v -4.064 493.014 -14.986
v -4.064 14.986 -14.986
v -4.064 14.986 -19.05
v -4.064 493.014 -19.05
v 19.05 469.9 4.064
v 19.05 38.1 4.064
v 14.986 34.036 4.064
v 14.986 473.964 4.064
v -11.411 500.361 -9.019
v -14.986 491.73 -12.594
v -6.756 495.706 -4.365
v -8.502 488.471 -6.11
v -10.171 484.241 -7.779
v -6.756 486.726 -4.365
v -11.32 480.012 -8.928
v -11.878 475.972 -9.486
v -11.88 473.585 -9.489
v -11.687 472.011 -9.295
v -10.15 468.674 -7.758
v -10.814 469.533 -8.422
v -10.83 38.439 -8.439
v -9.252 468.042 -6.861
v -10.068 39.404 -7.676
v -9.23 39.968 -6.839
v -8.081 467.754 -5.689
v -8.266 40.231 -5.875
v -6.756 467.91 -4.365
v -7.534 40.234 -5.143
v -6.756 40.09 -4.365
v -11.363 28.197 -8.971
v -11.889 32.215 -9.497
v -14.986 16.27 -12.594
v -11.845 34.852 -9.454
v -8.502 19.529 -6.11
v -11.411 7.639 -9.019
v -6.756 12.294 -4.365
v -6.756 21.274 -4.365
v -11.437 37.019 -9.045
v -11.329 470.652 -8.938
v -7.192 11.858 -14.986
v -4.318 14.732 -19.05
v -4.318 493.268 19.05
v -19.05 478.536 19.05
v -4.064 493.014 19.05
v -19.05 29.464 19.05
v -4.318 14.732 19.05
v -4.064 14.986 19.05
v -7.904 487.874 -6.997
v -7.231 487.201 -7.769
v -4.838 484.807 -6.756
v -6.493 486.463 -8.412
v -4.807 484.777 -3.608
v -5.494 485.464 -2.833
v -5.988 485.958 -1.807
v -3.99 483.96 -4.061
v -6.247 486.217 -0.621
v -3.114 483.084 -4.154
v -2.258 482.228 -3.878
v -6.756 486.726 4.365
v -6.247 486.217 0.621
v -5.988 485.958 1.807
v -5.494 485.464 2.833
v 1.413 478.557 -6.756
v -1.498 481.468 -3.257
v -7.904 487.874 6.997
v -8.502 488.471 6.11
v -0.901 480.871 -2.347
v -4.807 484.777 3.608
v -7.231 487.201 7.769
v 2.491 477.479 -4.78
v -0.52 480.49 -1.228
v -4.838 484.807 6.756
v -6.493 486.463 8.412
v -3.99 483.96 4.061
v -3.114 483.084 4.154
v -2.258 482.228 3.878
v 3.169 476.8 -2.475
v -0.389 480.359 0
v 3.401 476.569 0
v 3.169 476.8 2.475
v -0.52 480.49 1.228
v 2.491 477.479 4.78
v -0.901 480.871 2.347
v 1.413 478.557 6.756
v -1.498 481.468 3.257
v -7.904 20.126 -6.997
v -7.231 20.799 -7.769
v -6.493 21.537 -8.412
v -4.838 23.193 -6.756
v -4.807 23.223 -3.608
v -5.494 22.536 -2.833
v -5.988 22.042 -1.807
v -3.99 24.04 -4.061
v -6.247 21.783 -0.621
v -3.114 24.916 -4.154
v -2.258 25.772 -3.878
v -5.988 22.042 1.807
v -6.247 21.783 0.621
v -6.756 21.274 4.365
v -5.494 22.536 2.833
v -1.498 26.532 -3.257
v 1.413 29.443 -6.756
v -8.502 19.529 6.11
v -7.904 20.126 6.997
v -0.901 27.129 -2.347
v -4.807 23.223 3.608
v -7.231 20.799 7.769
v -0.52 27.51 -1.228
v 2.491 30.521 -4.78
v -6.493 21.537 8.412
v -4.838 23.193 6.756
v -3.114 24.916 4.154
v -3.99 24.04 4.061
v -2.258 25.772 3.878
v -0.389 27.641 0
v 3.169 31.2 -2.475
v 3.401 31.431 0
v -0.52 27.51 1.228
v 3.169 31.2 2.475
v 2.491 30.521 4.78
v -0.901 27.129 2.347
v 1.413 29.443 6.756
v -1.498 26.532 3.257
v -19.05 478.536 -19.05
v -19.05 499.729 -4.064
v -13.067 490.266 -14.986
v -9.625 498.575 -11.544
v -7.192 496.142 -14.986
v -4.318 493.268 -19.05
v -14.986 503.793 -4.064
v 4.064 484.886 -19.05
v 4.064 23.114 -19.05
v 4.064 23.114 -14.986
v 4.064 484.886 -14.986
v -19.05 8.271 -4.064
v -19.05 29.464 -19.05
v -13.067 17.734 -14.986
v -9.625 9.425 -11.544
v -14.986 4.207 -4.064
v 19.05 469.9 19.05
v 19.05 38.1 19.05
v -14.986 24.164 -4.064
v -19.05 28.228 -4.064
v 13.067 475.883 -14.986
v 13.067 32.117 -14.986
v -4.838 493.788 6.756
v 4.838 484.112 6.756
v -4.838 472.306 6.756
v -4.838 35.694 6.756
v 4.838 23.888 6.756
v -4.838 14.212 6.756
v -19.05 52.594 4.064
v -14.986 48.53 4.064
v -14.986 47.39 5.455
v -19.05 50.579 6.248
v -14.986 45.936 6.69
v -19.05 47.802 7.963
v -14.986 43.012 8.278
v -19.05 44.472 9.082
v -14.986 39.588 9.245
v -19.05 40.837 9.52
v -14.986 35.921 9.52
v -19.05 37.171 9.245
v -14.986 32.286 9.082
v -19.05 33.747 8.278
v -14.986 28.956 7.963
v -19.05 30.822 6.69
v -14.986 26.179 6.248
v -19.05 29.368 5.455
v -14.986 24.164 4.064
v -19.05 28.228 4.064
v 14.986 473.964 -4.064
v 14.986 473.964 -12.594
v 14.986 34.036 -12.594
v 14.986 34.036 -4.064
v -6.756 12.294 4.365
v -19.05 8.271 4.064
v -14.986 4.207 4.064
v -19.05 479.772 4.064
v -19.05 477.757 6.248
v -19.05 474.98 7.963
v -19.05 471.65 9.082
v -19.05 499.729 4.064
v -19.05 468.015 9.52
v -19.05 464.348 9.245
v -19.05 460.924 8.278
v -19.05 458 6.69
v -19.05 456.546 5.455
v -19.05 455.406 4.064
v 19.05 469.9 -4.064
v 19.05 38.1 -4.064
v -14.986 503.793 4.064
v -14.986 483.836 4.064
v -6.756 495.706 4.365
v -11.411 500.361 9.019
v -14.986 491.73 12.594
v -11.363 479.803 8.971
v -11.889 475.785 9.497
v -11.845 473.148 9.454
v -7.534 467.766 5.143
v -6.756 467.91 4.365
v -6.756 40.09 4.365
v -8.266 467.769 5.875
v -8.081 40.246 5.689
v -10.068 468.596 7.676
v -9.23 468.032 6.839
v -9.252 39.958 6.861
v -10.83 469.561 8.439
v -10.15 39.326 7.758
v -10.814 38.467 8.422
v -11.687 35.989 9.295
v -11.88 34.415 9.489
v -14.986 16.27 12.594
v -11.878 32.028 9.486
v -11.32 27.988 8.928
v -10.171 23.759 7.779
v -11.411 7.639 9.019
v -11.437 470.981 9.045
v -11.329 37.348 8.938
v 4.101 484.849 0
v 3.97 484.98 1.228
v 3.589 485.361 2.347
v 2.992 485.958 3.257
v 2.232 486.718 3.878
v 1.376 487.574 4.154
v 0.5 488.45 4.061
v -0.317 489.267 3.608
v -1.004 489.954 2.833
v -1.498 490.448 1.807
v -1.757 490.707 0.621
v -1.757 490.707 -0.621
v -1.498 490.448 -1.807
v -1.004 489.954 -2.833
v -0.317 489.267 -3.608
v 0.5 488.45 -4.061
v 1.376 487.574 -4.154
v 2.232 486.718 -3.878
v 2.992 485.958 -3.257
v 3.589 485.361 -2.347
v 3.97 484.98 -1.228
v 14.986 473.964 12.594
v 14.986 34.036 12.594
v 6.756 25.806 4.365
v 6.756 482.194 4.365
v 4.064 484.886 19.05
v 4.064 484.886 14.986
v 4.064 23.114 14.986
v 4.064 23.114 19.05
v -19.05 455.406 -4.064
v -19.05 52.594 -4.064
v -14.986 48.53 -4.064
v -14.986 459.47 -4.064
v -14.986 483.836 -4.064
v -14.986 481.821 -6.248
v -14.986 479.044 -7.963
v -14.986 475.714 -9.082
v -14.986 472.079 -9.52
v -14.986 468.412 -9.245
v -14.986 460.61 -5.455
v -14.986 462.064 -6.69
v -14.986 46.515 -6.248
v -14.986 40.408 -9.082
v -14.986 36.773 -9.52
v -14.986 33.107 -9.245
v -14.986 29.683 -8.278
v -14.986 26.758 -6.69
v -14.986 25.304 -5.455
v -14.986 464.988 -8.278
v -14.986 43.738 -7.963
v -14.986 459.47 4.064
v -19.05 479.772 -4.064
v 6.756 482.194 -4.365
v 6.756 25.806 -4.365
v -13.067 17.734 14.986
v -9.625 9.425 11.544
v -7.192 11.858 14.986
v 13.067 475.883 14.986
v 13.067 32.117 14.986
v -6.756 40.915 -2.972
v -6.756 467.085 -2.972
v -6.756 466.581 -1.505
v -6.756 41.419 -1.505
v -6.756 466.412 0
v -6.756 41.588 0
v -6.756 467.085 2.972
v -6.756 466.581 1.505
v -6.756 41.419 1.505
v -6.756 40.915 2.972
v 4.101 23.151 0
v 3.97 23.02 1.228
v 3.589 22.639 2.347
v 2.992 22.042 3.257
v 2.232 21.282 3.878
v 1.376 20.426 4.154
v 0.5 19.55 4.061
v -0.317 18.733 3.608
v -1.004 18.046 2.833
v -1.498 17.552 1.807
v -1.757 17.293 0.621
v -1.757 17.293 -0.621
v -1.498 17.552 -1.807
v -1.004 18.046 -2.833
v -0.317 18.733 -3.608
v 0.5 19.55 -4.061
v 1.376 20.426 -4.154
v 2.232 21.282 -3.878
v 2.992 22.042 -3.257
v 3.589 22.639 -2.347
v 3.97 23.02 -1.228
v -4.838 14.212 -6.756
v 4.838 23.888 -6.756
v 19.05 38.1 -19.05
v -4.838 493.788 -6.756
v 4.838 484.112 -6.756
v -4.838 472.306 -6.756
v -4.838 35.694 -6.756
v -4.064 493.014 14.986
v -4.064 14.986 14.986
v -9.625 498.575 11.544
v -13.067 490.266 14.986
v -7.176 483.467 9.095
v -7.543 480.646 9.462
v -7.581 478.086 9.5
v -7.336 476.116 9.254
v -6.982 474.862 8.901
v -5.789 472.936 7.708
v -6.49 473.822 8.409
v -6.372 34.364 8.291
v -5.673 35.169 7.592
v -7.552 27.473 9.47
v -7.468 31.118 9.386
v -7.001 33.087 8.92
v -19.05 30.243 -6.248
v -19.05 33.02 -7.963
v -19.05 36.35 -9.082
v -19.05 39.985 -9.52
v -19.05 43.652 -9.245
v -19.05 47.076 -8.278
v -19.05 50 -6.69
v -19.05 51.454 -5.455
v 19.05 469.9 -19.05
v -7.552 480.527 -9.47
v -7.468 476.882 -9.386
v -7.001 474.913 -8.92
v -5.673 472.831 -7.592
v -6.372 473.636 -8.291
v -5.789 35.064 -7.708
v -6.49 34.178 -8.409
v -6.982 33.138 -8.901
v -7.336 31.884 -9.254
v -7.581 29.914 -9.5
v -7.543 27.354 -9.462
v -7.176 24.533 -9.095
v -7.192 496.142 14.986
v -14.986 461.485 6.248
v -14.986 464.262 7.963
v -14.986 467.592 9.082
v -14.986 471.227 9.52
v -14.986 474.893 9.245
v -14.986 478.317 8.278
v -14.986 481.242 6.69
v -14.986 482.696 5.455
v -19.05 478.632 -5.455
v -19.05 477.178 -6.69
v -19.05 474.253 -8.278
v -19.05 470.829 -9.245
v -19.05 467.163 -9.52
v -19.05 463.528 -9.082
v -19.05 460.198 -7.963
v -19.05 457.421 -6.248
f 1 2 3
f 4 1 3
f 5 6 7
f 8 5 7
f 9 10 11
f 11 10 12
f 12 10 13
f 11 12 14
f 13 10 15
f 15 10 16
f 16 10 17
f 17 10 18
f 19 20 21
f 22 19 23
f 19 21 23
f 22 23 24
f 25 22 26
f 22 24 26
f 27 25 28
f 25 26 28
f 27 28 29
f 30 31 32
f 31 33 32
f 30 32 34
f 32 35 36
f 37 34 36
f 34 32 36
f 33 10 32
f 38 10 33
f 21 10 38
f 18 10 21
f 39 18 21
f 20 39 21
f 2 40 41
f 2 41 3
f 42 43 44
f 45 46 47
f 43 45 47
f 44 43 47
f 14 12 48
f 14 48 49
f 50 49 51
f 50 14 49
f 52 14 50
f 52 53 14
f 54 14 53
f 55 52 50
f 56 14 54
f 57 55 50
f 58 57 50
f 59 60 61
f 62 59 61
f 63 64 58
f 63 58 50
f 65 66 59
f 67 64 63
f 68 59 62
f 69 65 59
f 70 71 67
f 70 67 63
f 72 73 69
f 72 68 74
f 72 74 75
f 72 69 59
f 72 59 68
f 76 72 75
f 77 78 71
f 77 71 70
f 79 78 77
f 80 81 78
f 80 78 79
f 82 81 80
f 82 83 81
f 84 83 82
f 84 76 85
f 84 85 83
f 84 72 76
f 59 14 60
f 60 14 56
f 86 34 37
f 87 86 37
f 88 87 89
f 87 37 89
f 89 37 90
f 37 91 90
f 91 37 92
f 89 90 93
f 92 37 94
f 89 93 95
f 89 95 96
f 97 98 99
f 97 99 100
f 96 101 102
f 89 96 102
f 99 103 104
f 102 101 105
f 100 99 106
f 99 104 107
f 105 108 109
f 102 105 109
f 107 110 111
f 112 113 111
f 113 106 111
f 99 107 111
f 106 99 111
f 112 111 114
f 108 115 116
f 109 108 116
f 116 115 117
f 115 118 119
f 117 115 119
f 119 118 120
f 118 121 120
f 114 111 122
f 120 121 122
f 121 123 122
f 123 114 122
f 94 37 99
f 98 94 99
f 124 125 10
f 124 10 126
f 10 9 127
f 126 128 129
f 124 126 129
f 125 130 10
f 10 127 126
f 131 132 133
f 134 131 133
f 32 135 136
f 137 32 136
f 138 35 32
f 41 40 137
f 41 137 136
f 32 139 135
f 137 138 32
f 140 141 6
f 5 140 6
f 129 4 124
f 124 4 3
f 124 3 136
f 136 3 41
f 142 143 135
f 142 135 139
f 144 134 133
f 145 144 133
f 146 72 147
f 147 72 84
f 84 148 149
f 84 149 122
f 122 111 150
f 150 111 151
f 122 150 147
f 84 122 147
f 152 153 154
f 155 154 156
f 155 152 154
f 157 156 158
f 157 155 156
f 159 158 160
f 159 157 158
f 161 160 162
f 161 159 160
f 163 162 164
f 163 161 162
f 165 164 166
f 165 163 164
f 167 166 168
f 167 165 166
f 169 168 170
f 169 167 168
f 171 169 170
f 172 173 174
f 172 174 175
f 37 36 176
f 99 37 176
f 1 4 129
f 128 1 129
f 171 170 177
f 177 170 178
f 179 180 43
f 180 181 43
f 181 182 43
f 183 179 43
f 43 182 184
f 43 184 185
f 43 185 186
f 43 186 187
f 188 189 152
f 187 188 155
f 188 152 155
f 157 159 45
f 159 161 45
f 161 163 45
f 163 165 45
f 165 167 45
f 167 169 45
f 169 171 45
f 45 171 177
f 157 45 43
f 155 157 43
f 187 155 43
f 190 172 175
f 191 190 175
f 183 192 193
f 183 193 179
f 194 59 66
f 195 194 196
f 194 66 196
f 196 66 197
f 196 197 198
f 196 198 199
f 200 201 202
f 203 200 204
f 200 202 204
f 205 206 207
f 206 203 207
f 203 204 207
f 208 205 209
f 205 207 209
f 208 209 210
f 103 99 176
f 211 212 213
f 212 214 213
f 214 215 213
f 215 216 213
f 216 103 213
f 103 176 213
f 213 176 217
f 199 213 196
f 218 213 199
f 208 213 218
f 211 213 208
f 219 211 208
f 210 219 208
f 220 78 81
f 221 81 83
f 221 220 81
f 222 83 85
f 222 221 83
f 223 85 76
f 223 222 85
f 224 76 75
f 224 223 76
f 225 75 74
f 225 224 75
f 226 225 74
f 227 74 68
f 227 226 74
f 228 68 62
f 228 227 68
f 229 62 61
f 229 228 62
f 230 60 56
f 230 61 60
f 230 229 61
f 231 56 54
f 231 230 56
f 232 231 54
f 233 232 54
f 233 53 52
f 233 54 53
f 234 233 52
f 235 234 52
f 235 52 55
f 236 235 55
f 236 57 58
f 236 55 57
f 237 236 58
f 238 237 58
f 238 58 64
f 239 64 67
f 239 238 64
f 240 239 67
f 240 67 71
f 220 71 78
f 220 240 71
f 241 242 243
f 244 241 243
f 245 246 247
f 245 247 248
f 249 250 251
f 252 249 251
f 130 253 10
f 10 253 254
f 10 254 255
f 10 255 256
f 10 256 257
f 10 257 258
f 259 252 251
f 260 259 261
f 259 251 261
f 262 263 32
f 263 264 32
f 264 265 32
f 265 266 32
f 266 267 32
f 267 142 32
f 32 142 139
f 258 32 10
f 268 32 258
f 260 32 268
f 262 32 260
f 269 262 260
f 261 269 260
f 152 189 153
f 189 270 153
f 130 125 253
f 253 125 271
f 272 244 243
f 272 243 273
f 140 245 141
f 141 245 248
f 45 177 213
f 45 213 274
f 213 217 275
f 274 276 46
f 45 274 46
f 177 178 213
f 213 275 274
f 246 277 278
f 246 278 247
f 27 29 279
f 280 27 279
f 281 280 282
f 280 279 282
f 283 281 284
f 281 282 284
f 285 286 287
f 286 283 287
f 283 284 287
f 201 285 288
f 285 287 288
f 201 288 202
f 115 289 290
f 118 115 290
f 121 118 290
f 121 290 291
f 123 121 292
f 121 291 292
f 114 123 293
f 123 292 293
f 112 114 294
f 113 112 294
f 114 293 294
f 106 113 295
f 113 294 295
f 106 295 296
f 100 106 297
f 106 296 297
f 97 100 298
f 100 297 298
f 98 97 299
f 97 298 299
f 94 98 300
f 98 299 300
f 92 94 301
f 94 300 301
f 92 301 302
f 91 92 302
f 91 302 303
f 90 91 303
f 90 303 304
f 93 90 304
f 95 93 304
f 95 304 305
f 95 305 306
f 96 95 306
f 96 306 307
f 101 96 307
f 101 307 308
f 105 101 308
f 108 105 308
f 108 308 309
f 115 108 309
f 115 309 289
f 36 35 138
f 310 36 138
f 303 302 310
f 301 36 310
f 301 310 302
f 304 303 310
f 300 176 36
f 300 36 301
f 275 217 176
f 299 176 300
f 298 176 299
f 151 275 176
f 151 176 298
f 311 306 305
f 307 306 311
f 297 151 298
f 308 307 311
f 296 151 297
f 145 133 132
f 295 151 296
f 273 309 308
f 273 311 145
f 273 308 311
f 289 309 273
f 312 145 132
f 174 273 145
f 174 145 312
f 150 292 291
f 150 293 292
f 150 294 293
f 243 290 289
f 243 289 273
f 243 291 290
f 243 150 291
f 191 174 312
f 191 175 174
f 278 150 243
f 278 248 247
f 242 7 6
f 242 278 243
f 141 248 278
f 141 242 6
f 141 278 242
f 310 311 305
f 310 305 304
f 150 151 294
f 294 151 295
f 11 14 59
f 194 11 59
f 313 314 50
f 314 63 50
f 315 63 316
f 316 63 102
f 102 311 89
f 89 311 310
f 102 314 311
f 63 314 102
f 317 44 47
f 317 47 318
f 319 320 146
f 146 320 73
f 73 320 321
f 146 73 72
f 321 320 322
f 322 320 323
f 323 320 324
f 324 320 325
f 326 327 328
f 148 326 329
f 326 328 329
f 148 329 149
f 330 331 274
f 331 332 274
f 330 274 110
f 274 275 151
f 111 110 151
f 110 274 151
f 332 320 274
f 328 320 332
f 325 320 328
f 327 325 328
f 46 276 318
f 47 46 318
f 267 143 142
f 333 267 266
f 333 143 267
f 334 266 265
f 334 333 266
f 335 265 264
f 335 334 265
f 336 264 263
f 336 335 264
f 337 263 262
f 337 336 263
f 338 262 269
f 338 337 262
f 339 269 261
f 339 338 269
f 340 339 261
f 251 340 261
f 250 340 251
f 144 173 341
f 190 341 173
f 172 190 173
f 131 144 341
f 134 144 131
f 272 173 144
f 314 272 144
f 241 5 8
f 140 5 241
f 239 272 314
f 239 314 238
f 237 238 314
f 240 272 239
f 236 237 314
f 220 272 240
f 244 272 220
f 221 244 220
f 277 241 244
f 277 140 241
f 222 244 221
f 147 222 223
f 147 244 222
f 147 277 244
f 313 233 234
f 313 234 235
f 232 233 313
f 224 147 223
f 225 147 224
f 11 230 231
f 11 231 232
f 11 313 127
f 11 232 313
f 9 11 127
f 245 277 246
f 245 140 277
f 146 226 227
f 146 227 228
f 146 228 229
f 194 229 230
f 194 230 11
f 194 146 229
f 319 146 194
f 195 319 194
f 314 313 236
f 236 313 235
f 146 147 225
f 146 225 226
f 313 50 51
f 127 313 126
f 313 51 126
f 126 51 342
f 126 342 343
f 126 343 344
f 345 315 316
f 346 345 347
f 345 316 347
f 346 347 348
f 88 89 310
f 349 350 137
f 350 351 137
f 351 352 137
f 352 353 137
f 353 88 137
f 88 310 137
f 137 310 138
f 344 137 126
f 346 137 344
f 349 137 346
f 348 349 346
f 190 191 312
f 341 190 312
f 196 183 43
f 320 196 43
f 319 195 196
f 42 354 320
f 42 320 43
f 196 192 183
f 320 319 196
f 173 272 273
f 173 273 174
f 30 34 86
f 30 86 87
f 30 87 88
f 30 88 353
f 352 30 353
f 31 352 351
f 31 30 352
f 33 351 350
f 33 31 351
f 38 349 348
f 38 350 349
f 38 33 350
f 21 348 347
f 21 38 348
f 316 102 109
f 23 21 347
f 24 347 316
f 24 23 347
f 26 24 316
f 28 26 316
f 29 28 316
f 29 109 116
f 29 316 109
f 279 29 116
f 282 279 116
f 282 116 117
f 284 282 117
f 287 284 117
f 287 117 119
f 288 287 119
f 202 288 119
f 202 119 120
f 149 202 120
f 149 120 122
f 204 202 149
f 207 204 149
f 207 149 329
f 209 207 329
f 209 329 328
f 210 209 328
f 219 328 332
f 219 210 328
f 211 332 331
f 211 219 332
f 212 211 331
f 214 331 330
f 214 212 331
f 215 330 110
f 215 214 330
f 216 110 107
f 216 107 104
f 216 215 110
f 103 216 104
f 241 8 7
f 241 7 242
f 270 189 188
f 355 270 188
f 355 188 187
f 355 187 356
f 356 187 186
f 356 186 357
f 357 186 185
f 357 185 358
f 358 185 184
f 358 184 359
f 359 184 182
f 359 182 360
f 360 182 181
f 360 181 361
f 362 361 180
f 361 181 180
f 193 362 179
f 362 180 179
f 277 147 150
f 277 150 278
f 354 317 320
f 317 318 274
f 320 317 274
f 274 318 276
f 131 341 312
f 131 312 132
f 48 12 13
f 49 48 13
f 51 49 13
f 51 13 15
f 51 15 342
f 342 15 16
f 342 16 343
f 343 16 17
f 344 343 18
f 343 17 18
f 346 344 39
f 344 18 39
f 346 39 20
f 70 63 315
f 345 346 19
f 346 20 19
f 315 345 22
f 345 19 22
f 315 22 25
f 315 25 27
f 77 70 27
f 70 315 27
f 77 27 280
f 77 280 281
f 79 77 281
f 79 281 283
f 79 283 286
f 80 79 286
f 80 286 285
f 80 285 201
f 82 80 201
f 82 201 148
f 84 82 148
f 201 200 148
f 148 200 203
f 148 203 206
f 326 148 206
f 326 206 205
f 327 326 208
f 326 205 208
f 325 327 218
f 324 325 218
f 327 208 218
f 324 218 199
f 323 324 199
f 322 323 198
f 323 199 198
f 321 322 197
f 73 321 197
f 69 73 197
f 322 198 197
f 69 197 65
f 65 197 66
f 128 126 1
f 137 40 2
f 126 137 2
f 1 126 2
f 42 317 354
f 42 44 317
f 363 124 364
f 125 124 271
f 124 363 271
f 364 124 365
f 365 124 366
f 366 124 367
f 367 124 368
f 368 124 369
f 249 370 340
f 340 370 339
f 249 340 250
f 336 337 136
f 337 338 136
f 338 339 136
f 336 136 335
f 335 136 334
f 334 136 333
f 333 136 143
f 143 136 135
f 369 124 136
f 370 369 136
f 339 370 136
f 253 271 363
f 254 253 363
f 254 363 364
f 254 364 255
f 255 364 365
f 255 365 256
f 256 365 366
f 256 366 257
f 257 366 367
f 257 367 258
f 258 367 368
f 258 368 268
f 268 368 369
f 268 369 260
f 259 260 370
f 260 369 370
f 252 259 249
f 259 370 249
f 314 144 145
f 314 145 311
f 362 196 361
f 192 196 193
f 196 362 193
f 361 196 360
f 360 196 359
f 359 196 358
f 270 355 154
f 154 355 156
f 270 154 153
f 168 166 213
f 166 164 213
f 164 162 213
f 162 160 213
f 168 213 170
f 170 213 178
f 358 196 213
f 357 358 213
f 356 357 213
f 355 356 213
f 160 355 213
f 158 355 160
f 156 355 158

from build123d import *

# Parameters (mm, degrees)
EXTRUDE1_DEPTH       = 508
EXTRUDE2_DEPTH       = 457.2
SKETCH6_R            = 4.1656
EXTRUDE5_DEPTH       = 500.656640854
SKETCH8_R            = 9.525
EXTRUDE7_DEPTH       = 44.45
EXTRUDE8_DEPTH       = 374.167192757
MIRROR7_COPY_1_DEPTH = 374.167192757


# Read off the part's stored shape, not the designer's step: 1515<1>
with BuildPart() as part:
    # Sketch1<2> → Extrude1 (new body)
    with BuildSketch(Plane(origin=(0, 0, 0), x_dir=(1, 0, 0), z_dir=(0, 1, 0))):
        Polygon((-6.7564, 4.364749804), (-6.7564, -4.364749804), (-14.986, -12.594349804), (-14.986, -4.064), (-19.05, -4.064), (-19.05, -19.05), (-4.064, -19.05), (-4.064, -14.986), (-13.067127258, -14.986), (-4.837527258, -6.7564), (4.837527258, -6.7564), (13.067127258, -14.986), (4.064, -14.986), (4.064, -19.05), (19.05, -19.05), (19.05, -4.064), (14.986, -4.064), (14.986, -12.594349804), (6.7564, -4.364749804), (6.7564, 4.364749804), (14.986, 12.594349804), (14.986, 4.064), (19.05, 4.064), (19.05, 19.05), (4.064, 19.05), (4.064, 14.986), (13.067127258, 14.986), (4.837527258, 6.7564), (-4.837527258, 6.7564), (-13.067127258, 14.986), (-4.064, 14.986), (-4.064, 19.05), (-19.05, 19.05), (-19.05, 4.064), (-14.986, 4.064), (-14.986, 12.594349804), align=None)
    extrude(amount=EXTRUDE1_DEPTH)

    # Sketch2 → Extrude2 (cut)
    with BuildSketch(Plane.XY.offset(19.05)):
        Polygon((-19.05, 508), (19.05, 508), (19.05, 469.9), align=None)
        Polygon((-19.05, 0), (19.05, 38.1), (19.05, 0), align=None)
    extrude(amount=-EXTRUDE2_DEPTH, mode=Mode.SUBTRACT)

    # Sketch6 → Extrude5 (cut, through all)
    with BuildSketch(Plane(origin=(-9.525, 9.525, 0), x_dir=(0, 0, -1), z_dir=(0.7071067811865436, -0.7071067811865515, 0))):
        with Locations(Location((0, 15.104615818, 0), (0, 0, 90))):
            Circle(SKETCH6_R)
    extrude5 = extrude(amount=-EXTRUDE5_DEPTH, mode=Mode.SUBTRACT)

    # Sketch8 → Extrude7 (cut)
    with BuildSketch(Plane(origin=(-45.446024484, 45.446024484, 0), x_dir=(0.7071067811865515, 0.7071067811865436, 0), z_dir=(0.7071067811865436, -0.7071067811865515, 0))):
        with Locations((15.104615818, 0)):
            Circle(SKETCH8_R)
    extrude7 = extrude(amount=EXTRUDE7_DEPTH, mode=Mode.SUBTRACT)

    # Mirror5: Extrude5, Extrude7 across plane
    add(extrude5.mirror(Plane.ZX.offset(254)), mode=Mode.SUBTRACT)
    add(extrude7.mirror(Plane.ZX.offset(254)), mode=Mode.SUBTRACT)

    # Sketch10 → Extrude8 (cut, through all)
    with BuildSketch(Plane(origin=(244.475, 244.475, 0), x_dir=(0, 0, -1), z_dir=(0.7071067811865436, 0.7071067811865515, 0))):
        Polygon((-19.05, 372.680629024), (-2.29695366, 372.680629024), (-2.29695366, 368.599481163), (-19.05, 351.846434823), align=None)
    extrude8 = extrude(amount=-EXTRUDE8_DEPTH, mode=Mode.SUBTRACT)

    # Mirror6: Extrude8 across plane
    add(extrude8.mirror(Plane.XY), mode=Mode.SUBTRACT)

    # Mirror7: Extrude8 across plane
    add(extrude8.mirror(Plane.ZX.offset(254)), mode=Mode.SUBTRACT)

    # Mirror7 copy 1 sketch → Mirror7 copy 1 (cut, through all)
    with BuildSketch(Plane(origin=(244.475, 263.525, 0), x_dir=(0, 0, 1), z_dir=(0.7071067811865436, -0.7071067811865515, 0))):
        Polygon((-19.05, 372.680629024), (-2.29695366, 372.680629024), (-2.29695366, 368.599481163), (-19.05, 351.846434823), align=None)
    extrude(amount=-MIRROR7_COPY_1_DEPTH, mode=Mode.SUBTRACT)


solid = part.part
